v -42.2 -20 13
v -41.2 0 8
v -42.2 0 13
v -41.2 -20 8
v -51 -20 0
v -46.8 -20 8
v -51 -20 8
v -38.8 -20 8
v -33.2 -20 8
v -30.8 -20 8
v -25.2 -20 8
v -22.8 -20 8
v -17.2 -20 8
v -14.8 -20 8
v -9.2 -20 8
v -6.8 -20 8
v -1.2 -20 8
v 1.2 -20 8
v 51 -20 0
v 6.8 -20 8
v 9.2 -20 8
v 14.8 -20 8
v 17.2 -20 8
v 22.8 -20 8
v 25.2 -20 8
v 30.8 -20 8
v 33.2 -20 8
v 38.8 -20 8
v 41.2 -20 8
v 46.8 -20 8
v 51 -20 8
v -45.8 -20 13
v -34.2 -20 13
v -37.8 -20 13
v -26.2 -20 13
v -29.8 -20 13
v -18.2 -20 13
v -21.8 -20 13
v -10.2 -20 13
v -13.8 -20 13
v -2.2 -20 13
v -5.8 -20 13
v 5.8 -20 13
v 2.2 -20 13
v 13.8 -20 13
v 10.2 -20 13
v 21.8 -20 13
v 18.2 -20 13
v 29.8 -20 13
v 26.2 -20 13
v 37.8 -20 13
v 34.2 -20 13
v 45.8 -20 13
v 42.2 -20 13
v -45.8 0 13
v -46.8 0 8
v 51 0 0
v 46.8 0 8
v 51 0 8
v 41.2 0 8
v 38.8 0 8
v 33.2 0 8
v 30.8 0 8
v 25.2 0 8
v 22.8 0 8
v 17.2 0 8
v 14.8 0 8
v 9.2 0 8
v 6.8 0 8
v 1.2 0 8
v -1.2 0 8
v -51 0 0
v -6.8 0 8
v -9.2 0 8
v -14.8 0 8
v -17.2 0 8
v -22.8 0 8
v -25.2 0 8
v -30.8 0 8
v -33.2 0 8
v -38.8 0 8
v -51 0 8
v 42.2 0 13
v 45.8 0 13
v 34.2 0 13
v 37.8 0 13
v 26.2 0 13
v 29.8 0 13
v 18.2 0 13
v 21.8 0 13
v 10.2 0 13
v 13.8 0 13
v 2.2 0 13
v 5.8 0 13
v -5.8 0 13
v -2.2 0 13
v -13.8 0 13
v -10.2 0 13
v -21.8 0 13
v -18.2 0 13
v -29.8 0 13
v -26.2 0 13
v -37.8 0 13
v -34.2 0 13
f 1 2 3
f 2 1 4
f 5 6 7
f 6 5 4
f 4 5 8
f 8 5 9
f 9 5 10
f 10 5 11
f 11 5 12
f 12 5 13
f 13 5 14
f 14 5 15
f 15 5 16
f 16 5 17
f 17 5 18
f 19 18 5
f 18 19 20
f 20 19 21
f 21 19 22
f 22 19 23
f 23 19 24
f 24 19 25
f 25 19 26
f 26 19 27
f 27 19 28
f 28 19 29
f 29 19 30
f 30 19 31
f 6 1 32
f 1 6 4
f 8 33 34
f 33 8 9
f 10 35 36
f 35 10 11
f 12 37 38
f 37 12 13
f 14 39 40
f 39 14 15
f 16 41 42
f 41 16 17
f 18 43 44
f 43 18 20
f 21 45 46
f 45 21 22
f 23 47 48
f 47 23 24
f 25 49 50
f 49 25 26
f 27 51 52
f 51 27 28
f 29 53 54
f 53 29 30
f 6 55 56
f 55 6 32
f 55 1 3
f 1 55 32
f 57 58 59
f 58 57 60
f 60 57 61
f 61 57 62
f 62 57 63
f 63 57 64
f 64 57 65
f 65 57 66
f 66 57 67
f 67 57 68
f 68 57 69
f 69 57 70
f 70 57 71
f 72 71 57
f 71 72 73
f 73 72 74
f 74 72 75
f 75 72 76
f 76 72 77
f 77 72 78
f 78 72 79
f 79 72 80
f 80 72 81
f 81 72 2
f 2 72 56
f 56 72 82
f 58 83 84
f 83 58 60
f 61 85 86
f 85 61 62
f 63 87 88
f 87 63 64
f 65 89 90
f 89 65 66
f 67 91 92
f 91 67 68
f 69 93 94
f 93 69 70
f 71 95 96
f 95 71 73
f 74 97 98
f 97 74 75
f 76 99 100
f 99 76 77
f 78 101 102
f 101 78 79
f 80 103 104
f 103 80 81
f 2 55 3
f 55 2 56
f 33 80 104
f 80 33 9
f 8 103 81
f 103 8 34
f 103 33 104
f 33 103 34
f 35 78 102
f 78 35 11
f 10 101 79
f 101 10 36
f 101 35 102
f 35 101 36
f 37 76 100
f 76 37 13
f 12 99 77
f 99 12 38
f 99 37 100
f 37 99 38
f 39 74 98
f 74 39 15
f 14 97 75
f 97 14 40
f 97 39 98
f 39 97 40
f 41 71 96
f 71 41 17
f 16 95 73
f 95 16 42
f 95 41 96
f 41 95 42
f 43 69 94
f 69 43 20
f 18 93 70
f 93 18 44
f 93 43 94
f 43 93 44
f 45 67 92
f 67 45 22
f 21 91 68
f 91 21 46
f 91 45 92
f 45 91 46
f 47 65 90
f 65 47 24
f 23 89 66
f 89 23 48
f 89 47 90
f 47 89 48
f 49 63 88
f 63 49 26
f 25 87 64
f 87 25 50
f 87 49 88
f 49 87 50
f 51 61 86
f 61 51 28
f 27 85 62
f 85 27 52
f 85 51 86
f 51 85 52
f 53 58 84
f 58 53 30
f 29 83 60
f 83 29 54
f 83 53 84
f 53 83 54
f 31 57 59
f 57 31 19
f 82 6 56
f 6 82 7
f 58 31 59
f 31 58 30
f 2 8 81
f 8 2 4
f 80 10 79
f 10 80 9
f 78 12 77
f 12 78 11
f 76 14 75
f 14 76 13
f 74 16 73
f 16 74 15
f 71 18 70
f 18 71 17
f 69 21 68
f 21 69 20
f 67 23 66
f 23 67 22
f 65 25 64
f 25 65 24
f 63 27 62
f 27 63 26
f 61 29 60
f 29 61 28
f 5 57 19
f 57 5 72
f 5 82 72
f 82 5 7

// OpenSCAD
$fn = 32;

// ----------------------------------------------------------------------
// Toothed rack, 12 teeth
// 8 mm pitch, 5 mm teeth
// ----------------------------------------------------------------------

// --- parameters (mm) ---
bar_w = 20;     // bar width (Y)
bar_h = 8;      // bar height (Z)
teeth = 12;     // number of teeth
pitch = 8;      // tooth pitch
tooth_h = 5;    // tooth height above the bar
root_w = 6;     // tooth width at the root
crest_w = 3.6;  // tooth width at the crest

// --- derived feature positions (mm) ---
span = (teeth - 1) * pitch;  // = 88   distance between the outer teeth
bar_l = span + root_w + 8;   // = 102   bar length: teeth plus 4 mm at each end
tooth_x = -span / 2;         // = -44   X of the first tooth
height = bar_h + tooth_h;    // = 13   overall height
feature_centers = [
  [tooth_x + 0 * pitch, -bar_w / 2],
  [tooth_x + 1 * pitch, -bar_w / 2],
  [tooth_x + 2 * pitch, -bar_w / 2],
  [tooth_x + 3 * pitch, -bar_w / 2],
  [tooth_x + 4 * pitch, -bar_w / 2],
  [tooth_x + 5 * pitch, -bar_w / 2],
  [tooth_x + 6 * pitch, -bar_w / 2],
  [tooth_x + 7 * pitch, -bar_w / 2],
  [tooth_x + 8 * pitch, -bar_w / 2],
  [tooth_x + 9 * pitch, -bar_w / 2],
  [tooth_x + 10 * pitch, -bar_w / 2],
  [tooth_x + 11 * pitch, -bar_w / 2]
];   // tooth centre line, drives the tooth loop

// bar with a rack of teeth, one extruded trapezoium per centre
module rack_tooth() {
  linear_extrude(height = bar_w)
    polygon(points = [
      [0, 0],
      [root_w, 0],
      [root_w / 2 + crest_w / 2, tooth_h + 1],
      [root_w / 2 - crest_w / 2, tooth_h + 1]
    ]);
}

union() {
  translate([-bar_l / 2, -bar_w, 0]) cube([bar_l, bar_w, bar_h]);
  for (centre = feature_centers)
    translate([centre[0] - root_w / 2, 0, bar_h - 1]) rotate([90, 0, 0]) rack_tooth();
}
